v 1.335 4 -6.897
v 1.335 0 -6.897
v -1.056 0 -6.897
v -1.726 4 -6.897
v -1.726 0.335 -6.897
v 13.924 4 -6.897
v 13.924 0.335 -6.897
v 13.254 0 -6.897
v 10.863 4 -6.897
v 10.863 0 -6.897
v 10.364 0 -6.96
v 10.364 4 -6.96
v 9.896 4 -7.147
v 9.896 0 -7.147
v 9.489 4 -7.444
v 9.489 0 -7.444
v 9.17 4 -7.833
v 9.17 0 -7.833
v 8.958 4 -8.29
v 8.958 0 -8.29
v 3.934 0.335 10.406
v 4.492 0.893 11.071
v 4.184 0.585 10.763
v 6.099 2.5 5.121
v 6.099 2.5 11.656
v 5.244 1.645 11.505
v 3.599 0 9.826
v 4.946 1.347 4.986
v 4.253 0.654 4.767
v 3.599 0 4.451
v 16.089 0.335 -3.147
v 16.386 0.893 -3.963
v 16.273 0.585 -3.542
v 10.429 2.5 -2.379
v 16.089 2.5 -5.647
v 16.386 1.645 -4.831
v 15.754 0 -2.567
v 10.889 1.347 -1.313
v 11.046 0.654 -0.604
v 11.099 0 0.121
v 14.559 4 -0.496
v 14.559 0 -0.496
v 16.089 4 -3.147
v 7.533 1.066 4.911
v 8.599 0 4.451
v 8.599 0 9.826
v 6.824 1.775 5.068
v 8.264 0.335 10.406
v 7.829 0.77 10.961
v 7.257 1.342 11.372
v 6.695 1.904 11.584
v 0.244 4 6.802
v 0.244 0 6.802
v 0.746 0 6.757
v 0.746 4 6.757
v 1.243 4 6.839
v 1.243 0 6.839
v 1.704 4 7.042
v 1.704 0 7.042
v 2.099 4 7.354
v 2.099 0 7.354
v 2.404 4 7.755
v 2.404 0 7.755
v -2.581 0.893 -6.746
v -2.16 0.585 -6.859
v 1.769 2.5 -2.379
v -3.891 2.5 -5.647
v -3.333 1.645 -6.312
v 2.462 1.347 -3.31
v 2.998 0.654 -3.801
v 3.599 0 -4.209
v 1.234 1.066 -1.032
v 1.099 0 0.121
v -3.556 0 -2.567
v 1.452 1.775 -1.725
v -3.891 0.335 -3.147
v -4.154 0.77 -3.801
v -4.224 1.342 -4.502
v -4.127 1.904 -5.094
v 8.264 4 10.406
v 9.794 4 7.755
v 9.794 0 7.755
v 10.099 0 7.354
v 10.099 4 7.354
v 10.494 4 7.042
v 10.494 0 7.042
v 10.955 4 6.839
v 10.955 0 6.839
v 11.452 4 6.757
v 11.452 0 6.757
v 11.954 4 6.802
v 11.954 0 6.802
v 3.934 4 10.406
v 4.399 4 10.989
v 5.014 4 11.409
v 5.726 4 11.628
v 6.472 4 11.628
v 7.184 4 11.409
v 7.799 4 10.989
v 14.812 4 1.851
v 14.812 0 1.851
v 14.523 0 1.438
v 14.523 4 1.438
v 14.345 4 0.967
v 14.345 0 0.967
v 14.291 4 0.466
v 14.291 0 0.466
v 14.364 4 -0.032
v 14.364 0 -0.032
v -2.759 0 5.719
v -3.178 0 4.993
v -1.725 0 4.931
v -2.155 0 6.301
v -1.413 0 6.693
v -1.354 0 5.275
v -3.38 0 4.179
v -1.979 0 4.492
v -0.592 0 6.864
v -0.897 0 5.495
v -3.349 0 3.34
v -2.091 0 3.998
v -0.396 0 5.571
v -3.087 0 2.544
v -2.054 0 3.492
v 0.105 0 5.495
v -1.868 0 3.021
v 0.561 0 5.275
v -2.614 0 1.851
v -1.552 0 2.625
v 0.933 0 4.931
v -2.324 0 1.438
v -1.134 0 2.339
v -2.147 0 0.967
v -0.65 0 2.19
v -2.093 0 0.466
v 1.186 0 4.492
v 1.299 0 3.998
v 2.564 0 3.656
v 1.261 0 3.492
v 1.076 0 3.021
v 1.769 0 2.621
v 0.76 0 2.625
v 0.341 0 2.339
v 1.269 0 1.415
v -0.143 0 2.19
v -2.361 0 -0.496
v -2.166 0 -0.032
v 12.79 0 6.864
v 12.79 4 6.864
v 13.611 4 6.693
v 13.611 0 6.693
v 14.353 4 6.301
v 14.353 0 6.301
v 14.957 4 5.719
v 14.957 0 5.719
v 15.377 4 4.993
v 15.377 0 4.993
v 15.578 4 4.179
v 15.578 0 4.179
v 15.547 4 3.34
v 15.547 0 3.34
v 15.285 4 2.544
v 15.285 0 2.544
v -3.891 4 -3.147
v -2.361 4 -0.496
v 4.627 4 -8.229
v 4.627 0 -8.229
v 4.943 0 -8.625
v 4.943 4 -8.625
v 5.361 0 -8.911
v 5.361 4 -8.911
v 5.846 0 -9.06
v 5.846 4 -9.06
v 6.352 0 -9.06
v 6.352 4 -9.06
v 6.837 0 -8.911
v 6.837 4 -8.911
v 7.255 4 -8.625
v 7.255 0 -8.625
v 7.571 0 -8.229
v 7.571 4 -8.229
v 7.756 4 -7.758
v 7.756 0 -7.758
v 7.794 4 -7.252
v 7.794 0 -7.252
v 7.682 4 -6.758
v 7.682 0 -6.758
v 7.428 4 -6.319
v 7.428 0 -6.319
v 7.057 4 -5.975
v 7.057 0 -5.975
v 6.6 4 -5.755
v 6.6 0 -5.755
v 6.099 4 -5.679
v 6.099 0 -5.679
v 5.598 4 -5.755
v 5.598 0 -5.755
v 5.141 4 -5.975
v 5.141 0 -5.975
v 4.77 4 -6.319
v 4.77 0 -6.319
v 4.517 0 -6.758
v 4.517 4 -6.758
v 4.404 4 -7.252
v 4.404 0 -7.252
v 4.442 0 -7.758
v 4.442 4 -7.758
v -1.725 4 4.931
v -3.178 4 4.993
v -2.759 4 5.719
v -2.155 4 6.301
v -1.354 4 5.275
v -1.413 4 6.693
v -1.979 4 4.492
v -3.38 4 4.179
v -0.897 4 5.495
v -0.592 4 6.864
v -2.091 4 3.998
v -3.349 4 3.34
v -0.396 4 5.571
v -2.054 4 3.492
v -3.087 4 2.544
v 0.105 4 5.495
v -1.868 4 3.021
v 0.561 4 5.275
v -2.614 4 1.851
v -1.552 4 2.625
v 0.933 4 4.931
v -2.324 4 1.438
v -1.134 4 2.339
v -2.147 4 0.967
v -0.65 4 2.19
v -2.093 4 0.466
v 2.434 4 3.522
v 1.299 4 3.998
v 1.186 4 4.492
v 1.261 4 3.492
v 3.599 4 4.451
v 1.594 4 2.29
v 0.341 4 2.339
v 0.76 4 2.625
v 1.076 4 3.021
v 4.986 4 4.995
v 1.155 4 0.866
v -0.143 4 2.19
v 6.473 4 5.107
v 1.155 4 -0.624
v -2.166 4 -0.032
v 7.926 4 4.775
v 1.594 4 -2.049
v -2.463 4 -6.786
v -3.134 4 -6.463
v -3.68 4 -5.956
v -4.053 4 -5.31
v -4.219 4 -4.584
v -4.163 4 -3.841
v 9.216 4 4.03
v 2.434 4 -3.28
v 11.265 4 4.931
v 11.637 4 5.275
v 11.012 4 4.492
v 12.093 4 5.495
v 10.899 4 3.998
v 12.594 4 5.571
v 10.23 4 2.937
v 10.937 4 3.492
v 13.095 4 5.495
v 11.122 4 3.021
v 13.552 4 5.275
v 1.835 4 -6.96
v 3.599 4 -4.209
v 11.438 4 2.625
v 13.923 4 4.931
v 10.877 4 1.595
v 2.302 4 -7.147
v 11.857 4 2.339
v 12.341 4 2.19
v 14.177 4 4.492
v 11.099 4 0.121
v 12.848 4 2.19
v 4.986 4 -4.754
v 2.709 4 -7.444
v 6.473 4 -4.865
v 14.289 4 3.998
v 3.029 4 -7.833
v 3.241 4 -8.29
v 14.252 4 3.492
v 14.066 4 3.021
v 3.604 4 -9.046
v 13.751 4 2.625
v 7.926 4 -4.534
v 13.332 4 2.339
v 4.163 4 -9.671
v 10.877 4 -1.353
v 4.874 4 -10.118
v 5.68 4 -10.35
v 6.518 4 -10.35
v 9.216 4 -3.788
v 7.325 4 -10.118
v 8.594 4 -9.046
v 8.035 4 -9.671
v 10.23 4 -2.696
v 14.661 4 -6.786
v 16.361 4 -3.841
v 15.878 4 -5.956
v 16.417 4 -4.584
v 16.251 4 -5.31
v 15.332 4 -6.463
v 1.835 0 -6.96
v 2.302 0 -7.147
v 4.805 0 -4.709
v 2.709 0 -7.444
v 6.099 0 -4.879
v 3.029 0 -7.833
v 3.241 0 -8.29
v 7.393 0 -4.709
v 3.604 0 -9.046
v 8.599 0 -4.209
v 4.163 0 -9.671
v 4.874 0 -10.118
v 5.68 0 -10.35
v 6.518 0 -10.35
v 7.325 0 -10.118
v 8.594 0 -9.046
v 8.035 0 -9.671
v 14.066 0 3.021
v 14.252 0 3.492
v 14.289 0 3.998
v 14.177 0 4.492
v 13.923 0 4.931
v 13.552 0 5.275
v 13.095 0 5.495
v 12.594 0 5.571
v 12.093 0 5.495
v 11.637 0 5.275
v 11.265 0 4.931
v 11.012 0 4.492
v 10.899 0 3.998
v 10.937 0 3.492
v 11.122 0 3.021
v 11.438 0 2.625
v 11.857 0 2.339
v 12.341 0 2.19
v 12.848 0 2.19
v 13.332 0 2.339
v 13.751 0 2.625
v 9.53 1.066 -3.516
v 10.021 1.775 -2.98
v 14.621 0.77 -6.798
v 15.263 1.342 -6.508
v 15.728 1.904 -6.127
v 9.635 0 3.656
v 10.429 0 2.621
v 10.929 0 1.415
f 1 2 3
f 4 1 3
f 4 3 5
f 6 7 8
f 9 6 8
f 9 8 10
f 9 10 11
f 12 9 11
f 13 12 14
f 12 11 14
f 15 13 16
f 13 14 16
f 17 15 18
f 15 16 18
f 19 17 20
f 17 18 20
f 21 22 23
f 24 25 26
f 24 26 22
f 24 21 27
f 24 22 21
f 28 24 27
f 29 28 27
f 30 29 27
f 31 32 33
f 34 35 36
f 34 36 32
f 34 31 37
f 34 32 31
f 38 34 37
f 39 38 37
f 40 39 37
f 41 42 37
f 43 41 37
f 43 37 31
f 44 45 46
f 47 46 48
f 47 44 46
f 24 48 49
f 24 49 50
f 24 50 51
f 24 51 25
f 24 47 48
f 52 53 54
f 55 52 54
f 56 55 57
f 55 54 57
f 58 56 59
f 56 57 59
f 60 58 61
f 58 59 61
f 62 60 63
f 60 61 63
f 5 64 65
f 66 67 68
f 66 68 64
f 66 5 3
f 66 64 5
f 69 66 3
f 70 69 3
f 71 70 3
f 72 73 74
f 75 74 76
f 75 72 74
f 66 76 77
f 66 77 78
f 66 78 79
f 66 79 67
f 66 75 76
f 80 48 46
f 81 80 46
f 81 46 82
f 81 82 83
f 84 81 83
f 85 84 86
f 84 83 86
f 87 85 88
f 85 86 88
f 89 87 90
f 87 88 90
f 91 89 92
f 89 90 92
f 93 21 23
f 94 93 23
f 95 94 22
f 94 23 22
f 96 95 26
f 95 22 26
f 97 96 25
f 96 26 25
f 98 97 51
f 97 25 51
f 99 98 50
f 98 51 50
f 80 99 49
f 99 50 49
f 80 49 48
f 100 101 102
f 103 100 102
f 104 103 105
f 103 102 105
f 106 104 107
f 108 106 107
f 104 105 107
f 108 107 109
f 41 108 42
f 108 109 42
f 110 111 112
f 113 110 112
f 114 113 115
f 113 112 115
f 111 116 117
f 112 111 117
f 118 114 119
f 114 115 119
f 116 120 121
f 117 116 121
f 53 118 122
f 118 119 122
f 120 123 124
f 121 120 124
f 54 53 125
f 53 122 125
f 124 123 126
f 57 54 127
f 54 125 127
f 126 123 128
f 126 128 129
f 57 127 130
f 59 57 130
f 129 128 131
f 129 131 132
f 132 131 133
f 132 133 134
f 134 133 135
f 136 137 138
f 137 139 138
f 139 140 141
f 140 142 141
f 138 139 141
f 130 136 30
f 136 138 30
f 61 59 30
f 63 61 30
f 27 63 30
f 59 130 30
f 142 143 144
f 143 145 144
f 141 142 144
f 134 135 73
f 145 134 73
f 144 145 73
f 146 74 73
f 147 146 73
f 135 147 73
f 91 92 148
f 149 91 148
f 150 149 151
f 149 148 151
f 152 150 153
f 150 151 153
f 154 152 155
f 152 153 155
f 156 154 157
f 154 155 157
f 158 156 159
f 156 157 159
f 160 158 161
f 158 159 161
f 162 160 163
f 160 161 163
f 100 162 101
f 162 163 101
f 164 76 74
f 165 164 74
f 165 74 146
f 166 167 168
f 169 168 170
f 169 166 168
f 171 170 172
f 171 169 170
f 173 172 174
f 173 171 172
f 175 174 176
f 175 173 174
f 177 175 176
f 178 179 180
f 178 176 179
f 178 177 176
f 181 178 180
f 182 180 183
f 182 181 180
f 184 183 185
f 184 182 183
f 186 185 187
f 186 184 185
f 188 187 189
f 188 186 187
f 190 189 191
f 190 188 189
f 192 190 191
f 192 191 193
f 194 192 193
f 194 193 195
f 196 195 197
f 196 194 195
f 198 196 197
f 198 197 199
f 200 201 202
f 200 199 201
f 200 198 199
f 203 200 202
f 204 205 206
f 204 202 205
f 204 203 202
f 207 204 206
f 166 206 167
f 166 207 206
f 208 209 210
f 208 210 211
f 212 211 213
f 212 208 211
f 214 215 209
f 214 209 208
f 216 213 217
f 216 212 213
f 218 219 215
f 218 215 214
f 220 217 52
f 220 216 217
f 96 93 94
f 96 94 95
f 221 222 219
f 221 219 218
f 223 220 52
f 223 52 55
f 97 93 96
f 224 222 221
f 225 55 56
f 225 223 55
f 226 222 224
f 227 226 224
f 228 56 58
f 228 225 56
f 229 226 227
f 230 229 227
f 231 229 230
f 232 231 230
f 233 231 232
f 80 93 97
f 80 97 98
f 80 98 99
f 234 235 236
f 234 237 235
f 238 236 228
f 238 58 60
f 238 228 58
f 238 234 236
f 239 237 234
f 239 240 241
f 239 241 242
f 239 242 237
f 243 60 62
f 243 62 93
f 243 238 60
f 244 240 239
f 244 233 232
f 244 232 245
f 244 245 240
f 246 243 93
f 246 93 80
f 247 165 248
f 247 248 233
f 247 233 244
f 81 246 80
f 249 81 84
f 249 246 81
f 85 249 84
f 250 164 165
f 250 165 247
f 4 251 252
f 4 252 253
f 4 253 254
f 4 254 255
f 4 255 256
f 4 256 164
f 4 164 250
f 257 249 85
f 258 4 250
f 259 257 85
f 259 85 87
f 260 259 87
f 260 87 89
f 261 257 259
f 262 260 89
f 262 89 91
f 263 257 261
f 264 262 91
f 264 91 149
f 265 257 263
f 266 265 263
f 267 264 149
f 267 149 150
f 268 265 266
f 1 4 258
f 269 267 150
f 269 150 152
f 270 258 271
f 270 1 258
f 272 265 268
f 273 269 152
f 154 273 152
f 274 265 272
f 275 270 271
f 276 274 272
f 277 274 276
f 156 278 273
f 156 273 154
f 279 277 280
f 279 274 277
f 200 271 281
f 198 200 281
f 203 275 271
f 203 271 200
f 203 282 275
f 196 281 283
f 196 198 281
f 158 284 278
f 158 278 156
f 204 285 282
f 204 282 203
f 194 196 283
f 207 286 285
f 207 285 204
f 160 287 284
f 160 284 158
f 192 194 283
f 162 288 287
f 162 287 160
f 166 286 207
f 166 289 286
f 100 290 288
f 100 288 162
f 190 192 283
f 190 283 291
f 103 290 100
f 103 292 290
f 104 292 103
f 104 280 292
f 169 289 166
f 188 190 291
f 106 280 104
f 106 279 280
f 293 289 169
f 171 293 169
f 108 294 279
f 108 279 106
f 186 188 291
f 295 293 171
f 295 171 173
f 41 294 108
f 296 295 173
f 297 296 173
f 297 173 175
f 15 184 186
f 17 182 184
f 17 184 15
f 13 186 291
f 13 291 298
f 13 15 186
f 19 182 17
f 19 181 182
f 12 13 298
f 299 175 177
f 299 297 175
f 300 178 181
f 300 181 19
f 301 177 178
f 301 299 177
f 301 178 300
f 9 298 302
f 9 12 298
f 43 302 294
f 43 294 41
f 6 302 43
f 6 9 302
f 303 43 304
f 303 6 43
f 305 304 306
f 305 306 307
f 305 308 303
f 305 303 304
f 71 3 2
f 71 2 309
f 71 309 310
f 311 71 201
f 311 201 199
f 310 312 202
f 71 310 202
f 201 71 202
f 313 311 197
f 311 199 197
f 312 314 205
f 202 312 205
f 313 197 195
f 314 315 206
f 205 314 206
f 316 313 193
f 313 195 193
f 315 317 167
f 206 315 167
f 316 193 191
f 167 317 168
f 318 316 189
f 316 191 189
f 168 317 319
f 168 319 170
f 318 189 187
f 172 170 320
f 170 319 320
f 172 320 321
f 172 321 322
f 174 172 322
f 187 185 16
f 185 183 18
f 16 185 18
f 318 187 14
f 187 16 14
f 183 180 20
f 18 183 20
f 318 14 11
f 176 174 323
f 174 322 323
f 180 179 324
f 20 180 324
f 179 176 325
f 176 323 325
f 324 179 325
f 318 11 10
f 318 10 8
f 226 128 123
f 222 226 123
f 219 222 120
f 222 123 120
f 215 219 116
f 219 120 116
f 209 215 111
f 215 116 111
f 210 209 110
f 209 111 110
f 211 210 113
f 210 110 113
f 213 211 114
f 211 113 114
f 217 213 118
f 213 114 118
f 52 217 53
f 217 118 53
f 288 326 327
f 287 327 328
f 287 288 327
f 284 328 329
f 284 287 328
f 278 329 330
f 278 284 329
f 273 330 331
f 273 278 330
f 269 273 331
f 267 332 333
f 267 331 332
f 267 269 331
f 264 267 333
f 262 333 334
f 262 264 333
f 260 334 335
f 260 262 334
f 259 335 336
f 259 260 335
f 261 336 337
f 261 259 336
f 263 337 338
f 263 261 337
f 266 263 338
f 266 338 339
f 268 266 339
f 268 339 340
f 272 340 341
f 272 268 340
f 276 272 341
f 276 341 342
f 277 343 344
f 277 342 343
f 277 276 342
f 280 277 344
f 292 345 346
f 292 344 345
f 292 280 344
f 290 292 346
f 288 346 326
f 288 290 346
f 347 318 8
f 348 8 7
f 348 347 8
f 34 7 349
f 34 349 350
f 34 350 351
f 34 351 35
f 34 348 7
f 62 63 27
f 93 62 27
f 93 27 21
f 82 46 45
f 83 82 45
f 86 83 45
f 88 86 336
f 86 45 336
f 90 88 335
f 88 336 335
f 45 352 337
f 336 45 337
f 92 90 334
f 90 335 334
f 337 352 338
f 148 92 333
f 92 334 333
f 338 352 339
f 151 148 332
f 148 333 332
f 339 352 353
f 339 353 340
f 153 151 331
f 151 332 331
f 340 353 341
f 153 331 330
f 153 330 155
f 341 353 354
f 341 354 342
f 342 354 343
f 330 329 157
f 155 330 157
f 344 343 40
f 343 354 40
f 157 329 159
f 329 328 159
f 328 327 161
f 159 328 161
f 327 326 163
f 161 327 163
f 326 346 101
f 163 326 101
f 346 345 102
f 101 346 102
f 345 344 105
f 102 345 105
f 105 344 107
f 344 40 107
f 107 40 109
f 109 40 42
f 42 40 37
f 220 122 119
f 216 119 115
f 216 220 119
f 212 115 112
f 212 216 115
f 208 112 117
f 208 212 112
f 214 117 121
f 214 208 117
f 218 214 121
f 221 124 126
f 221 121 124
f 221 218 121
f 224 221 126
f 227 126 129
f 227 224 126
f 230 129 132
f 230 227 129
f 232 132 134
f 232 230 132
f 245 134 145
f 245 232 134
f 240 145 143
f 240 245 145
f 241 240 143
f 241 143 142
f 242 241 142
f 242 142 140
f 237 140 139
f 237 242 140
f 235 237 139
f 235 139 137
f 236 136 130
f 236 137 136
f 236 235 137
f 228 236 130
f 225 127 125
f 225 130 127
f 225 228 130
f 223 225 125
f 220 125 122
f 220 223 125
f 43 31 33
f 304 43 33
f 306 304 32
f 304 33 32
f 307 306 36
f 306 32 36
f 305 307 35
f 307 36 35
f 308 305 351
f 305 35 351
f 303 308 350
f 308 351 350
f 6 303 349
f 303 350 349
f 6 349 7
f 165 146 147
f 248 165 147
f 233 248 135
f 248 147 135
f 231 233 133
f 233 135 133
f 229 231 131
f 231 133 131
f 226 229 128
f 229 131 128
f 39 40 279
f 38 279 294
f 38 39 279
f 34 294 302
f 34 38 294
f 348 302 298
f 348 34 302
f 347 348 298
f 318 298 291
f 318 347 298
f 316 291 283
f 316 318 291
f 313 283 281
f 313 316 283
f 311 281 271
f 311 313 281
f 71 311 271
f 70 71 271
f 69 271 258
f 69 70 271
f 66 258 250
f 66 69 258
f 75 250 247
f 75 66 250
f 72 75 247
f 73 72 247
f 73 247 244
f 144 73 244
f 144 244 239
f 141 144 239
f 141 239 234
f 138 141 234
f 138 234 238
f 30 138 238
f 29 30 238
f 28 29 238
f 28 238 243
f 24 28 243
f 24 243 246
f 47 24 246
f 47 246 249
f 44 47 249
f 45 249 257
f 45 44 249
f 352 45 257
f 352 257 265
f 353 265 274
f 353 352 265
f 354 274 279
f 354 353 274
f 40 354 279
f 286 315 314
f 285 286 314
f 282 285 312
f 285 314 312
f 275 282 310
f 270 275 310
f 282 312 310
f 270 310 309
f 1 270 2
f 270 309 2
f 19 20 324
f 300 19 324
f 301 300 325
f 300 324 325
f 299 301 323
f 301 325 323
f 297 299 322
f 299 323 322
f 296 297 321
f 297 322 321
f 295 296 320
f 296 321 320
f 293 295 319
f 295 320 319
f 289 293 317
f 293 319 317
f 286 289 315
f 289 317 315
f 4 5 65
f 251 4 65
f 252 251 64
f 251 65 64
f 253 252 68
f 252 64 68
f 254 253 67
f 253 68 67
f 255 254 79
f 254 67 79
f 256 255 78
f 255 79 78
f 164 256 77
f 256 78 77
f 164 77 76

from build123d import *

# Parameters (mm, degrees)
SKETCH1_R         = 5
EXTRUDE1_DEPTH    = 4
CIRPATTERN2_COUNT = 3
EXTRUDE4_START    = 4.45086
EXTRUDE4_DEPTH    = 7.205259
EXTRUDE5_START    = 4.330127
EXTRUDE5_DEPTH    = 7.205258
EXTRUDE6_START    = 4.330127
EXTRUDE6_DEPTH    = 7.205258


with BuildPart() as part:
    # Sketch1 → Extrude1 (new body)
    with BuildSketch(Plane(origin=(0, 0, 0), x_dir=(1, 0, 0), z_dir=(0, 1, 0))):
        with BuildLine():
            Line((-3.89089061, 3.146959138), (-2.360502052, 0.4962484))
            ThreePointArc((-2.360502052, 0.4962484), (-2.104118872, -0.718531203), (-2.613989574, -1.850544314))
            ThreePointArc((-2.613989574, -1.850544314), (-2.994220859, -5.370733384), (0.244467944, -6.801537968))
            ThreePointArc((0.244467944, -6.801537968), (1.479755407, -6.925983542), (2.403593813, -7.75540769))
            Line((2.403593813, -7.75540769), (3.933982371, -10.406118428))
            ThreePointArc((3.933982371, -10.406118428), (6.099045881, -11.656118428), (8.26410939, -10.406118428))
            Line((8.26410939, -10.406118428), (9.794497948, -7.75540769))
            ThreePointArc((9.794497948, -7.75540769), (10.718336354, -6.925983542), (11.953623817, -6.801537968))
            ThreePointArc((11.953623817, -6.801537968), (15.192312621, -5.370733384), (14.812081336, -1.850544314))
            ThreePointArc((14.812081336, -1.850544314), (14.302210633, -0.718531203), (14.558593813, 0.4962484))
            Line((14.558593813, 0.4962484), (16.088982371, 3.146959138))
            ThreePointArc((16.088982371, 3.146959138), (16.088982371, 5.646959138), (13.923918862, 6.896959138))
            Line((13.923918862, 6.896959138), (10.863141746, 6.896959138))
            ThreePointArc((10.863141746, 6.896959138), (9.68292016, 7.282314592), (8.9575034, 8.289882129))
            ThreePointArc((8.9575034, 8.289882129), (6.099045881, 10.379266616), (3.240588362, 8.289882129))
            ThreePointArc((3.240588362, 8.289882129), (2.515171602, 7.282314592), (1.334950016, 6.896959138))
            Line((1.334950016, 6.896959138), (-1.7258271, 6.896959138))
            ThreePointArc((-1.7258271, 6.896959138), (-3.89089061, 5.646959138), (-3.89089061, 3.146959138))
        make_face()
        with Locations((6.099045881, -0.120733384)):
            Circle(SKETCH1_R, mode=Mode.SUBTRACT)
    extrude(amount=EXTRUDE1_DEPTH)

    # Sketch6 → M3 Clearance Hole1 (revolve, cut)
    with BuildSketch(Plane(origin=(-0.396144648, 4, 3.870733384), x_dir=(0, 0, 1), z_dir=(1, 0, 0))):
        Polygon((0, 0), (0, 11.021463052), (1.7, 10), (1.7, 0), align=None)
    m3_clearance_hole1 = revolve(axis=Axis((-0.396144648, 10.35, 3.870733384), (0, -1, 0)), mode=Mode.SUBTRACT)

    # CirPattern2: M3 Clearance Hole1 ×3 about axis
    cirpattern2_axis = Axis((6.099045881, 0, 0.120733384), (0, 1, 0))
    for i in range(1, CIRPATTERN2_COUNT):
        add(m3_clearance_hole1.rotate(cirpattern2_axis, i * 360 / CIRPATTERN2_COUNT), mode=Mode.SUBTRACT)

    # GrooveSketch → Extrude4 (cut)
    with BuildSketch(Plane.XY.offset(EXTRUDE4_START)):
        Polygon((34.668922444, -26.069876563), (8.599045881, 0), (6.099045881, 2.5), (3.599045881, 0), (-22.470830682, -26.069876563), (-22.470830682, -99.806622573), (34.668922444, -99.806622573), align=None)
    extrude(amount=EXTRUDE4_DEPTH, mode=Mode.SUBTRACT)

    # Sketch9 → Extrude5 (cut)
    with BuildSketch(Plane(origin=(4.6265635, 0, 2.671147682), x_dir=(-0.5, 0, 0.866025404), z_dir=(-0.866025404, 0, -0.5)).offset(EXTRUDE5_START)):
        Polygon((32.223222882, -32.668187644), (-0.444964763, 0), (-2.944964763, 2.5), (-5.444964763, 0), (-38.113152407, -32.668187644), (-38.113152407, -125.067775694), (32.223222882, -125.067775694), align=None)
    extrude(amount=EXTRUDE5_DEPTH, mode=Mode.SUBTRACT)

    # Sketch10 → Extrude6 (cut)
    with BuildSketch(Plane(origin=(4.522005322, 0, -2.61078099), x_dir=(-0.5, 0, -0.866025404), z_dir=(0.866025404, 0, -0.5)).offset(EXTRUDE6_START)):
        Polygon((32.014106526, -32.668187644), (-0.654081118, 0), (-3.154081118, 2.5), (-5.654081118, 0), (-38.322268763, -32.668187644), (-38.322268763, -125.067775694), (32.014106526, -125.067775694), align=None)
    extrude(amount=EXTRUDE6_DEPTH, mode=Mode.SUBTRACT)


solid = part.part
